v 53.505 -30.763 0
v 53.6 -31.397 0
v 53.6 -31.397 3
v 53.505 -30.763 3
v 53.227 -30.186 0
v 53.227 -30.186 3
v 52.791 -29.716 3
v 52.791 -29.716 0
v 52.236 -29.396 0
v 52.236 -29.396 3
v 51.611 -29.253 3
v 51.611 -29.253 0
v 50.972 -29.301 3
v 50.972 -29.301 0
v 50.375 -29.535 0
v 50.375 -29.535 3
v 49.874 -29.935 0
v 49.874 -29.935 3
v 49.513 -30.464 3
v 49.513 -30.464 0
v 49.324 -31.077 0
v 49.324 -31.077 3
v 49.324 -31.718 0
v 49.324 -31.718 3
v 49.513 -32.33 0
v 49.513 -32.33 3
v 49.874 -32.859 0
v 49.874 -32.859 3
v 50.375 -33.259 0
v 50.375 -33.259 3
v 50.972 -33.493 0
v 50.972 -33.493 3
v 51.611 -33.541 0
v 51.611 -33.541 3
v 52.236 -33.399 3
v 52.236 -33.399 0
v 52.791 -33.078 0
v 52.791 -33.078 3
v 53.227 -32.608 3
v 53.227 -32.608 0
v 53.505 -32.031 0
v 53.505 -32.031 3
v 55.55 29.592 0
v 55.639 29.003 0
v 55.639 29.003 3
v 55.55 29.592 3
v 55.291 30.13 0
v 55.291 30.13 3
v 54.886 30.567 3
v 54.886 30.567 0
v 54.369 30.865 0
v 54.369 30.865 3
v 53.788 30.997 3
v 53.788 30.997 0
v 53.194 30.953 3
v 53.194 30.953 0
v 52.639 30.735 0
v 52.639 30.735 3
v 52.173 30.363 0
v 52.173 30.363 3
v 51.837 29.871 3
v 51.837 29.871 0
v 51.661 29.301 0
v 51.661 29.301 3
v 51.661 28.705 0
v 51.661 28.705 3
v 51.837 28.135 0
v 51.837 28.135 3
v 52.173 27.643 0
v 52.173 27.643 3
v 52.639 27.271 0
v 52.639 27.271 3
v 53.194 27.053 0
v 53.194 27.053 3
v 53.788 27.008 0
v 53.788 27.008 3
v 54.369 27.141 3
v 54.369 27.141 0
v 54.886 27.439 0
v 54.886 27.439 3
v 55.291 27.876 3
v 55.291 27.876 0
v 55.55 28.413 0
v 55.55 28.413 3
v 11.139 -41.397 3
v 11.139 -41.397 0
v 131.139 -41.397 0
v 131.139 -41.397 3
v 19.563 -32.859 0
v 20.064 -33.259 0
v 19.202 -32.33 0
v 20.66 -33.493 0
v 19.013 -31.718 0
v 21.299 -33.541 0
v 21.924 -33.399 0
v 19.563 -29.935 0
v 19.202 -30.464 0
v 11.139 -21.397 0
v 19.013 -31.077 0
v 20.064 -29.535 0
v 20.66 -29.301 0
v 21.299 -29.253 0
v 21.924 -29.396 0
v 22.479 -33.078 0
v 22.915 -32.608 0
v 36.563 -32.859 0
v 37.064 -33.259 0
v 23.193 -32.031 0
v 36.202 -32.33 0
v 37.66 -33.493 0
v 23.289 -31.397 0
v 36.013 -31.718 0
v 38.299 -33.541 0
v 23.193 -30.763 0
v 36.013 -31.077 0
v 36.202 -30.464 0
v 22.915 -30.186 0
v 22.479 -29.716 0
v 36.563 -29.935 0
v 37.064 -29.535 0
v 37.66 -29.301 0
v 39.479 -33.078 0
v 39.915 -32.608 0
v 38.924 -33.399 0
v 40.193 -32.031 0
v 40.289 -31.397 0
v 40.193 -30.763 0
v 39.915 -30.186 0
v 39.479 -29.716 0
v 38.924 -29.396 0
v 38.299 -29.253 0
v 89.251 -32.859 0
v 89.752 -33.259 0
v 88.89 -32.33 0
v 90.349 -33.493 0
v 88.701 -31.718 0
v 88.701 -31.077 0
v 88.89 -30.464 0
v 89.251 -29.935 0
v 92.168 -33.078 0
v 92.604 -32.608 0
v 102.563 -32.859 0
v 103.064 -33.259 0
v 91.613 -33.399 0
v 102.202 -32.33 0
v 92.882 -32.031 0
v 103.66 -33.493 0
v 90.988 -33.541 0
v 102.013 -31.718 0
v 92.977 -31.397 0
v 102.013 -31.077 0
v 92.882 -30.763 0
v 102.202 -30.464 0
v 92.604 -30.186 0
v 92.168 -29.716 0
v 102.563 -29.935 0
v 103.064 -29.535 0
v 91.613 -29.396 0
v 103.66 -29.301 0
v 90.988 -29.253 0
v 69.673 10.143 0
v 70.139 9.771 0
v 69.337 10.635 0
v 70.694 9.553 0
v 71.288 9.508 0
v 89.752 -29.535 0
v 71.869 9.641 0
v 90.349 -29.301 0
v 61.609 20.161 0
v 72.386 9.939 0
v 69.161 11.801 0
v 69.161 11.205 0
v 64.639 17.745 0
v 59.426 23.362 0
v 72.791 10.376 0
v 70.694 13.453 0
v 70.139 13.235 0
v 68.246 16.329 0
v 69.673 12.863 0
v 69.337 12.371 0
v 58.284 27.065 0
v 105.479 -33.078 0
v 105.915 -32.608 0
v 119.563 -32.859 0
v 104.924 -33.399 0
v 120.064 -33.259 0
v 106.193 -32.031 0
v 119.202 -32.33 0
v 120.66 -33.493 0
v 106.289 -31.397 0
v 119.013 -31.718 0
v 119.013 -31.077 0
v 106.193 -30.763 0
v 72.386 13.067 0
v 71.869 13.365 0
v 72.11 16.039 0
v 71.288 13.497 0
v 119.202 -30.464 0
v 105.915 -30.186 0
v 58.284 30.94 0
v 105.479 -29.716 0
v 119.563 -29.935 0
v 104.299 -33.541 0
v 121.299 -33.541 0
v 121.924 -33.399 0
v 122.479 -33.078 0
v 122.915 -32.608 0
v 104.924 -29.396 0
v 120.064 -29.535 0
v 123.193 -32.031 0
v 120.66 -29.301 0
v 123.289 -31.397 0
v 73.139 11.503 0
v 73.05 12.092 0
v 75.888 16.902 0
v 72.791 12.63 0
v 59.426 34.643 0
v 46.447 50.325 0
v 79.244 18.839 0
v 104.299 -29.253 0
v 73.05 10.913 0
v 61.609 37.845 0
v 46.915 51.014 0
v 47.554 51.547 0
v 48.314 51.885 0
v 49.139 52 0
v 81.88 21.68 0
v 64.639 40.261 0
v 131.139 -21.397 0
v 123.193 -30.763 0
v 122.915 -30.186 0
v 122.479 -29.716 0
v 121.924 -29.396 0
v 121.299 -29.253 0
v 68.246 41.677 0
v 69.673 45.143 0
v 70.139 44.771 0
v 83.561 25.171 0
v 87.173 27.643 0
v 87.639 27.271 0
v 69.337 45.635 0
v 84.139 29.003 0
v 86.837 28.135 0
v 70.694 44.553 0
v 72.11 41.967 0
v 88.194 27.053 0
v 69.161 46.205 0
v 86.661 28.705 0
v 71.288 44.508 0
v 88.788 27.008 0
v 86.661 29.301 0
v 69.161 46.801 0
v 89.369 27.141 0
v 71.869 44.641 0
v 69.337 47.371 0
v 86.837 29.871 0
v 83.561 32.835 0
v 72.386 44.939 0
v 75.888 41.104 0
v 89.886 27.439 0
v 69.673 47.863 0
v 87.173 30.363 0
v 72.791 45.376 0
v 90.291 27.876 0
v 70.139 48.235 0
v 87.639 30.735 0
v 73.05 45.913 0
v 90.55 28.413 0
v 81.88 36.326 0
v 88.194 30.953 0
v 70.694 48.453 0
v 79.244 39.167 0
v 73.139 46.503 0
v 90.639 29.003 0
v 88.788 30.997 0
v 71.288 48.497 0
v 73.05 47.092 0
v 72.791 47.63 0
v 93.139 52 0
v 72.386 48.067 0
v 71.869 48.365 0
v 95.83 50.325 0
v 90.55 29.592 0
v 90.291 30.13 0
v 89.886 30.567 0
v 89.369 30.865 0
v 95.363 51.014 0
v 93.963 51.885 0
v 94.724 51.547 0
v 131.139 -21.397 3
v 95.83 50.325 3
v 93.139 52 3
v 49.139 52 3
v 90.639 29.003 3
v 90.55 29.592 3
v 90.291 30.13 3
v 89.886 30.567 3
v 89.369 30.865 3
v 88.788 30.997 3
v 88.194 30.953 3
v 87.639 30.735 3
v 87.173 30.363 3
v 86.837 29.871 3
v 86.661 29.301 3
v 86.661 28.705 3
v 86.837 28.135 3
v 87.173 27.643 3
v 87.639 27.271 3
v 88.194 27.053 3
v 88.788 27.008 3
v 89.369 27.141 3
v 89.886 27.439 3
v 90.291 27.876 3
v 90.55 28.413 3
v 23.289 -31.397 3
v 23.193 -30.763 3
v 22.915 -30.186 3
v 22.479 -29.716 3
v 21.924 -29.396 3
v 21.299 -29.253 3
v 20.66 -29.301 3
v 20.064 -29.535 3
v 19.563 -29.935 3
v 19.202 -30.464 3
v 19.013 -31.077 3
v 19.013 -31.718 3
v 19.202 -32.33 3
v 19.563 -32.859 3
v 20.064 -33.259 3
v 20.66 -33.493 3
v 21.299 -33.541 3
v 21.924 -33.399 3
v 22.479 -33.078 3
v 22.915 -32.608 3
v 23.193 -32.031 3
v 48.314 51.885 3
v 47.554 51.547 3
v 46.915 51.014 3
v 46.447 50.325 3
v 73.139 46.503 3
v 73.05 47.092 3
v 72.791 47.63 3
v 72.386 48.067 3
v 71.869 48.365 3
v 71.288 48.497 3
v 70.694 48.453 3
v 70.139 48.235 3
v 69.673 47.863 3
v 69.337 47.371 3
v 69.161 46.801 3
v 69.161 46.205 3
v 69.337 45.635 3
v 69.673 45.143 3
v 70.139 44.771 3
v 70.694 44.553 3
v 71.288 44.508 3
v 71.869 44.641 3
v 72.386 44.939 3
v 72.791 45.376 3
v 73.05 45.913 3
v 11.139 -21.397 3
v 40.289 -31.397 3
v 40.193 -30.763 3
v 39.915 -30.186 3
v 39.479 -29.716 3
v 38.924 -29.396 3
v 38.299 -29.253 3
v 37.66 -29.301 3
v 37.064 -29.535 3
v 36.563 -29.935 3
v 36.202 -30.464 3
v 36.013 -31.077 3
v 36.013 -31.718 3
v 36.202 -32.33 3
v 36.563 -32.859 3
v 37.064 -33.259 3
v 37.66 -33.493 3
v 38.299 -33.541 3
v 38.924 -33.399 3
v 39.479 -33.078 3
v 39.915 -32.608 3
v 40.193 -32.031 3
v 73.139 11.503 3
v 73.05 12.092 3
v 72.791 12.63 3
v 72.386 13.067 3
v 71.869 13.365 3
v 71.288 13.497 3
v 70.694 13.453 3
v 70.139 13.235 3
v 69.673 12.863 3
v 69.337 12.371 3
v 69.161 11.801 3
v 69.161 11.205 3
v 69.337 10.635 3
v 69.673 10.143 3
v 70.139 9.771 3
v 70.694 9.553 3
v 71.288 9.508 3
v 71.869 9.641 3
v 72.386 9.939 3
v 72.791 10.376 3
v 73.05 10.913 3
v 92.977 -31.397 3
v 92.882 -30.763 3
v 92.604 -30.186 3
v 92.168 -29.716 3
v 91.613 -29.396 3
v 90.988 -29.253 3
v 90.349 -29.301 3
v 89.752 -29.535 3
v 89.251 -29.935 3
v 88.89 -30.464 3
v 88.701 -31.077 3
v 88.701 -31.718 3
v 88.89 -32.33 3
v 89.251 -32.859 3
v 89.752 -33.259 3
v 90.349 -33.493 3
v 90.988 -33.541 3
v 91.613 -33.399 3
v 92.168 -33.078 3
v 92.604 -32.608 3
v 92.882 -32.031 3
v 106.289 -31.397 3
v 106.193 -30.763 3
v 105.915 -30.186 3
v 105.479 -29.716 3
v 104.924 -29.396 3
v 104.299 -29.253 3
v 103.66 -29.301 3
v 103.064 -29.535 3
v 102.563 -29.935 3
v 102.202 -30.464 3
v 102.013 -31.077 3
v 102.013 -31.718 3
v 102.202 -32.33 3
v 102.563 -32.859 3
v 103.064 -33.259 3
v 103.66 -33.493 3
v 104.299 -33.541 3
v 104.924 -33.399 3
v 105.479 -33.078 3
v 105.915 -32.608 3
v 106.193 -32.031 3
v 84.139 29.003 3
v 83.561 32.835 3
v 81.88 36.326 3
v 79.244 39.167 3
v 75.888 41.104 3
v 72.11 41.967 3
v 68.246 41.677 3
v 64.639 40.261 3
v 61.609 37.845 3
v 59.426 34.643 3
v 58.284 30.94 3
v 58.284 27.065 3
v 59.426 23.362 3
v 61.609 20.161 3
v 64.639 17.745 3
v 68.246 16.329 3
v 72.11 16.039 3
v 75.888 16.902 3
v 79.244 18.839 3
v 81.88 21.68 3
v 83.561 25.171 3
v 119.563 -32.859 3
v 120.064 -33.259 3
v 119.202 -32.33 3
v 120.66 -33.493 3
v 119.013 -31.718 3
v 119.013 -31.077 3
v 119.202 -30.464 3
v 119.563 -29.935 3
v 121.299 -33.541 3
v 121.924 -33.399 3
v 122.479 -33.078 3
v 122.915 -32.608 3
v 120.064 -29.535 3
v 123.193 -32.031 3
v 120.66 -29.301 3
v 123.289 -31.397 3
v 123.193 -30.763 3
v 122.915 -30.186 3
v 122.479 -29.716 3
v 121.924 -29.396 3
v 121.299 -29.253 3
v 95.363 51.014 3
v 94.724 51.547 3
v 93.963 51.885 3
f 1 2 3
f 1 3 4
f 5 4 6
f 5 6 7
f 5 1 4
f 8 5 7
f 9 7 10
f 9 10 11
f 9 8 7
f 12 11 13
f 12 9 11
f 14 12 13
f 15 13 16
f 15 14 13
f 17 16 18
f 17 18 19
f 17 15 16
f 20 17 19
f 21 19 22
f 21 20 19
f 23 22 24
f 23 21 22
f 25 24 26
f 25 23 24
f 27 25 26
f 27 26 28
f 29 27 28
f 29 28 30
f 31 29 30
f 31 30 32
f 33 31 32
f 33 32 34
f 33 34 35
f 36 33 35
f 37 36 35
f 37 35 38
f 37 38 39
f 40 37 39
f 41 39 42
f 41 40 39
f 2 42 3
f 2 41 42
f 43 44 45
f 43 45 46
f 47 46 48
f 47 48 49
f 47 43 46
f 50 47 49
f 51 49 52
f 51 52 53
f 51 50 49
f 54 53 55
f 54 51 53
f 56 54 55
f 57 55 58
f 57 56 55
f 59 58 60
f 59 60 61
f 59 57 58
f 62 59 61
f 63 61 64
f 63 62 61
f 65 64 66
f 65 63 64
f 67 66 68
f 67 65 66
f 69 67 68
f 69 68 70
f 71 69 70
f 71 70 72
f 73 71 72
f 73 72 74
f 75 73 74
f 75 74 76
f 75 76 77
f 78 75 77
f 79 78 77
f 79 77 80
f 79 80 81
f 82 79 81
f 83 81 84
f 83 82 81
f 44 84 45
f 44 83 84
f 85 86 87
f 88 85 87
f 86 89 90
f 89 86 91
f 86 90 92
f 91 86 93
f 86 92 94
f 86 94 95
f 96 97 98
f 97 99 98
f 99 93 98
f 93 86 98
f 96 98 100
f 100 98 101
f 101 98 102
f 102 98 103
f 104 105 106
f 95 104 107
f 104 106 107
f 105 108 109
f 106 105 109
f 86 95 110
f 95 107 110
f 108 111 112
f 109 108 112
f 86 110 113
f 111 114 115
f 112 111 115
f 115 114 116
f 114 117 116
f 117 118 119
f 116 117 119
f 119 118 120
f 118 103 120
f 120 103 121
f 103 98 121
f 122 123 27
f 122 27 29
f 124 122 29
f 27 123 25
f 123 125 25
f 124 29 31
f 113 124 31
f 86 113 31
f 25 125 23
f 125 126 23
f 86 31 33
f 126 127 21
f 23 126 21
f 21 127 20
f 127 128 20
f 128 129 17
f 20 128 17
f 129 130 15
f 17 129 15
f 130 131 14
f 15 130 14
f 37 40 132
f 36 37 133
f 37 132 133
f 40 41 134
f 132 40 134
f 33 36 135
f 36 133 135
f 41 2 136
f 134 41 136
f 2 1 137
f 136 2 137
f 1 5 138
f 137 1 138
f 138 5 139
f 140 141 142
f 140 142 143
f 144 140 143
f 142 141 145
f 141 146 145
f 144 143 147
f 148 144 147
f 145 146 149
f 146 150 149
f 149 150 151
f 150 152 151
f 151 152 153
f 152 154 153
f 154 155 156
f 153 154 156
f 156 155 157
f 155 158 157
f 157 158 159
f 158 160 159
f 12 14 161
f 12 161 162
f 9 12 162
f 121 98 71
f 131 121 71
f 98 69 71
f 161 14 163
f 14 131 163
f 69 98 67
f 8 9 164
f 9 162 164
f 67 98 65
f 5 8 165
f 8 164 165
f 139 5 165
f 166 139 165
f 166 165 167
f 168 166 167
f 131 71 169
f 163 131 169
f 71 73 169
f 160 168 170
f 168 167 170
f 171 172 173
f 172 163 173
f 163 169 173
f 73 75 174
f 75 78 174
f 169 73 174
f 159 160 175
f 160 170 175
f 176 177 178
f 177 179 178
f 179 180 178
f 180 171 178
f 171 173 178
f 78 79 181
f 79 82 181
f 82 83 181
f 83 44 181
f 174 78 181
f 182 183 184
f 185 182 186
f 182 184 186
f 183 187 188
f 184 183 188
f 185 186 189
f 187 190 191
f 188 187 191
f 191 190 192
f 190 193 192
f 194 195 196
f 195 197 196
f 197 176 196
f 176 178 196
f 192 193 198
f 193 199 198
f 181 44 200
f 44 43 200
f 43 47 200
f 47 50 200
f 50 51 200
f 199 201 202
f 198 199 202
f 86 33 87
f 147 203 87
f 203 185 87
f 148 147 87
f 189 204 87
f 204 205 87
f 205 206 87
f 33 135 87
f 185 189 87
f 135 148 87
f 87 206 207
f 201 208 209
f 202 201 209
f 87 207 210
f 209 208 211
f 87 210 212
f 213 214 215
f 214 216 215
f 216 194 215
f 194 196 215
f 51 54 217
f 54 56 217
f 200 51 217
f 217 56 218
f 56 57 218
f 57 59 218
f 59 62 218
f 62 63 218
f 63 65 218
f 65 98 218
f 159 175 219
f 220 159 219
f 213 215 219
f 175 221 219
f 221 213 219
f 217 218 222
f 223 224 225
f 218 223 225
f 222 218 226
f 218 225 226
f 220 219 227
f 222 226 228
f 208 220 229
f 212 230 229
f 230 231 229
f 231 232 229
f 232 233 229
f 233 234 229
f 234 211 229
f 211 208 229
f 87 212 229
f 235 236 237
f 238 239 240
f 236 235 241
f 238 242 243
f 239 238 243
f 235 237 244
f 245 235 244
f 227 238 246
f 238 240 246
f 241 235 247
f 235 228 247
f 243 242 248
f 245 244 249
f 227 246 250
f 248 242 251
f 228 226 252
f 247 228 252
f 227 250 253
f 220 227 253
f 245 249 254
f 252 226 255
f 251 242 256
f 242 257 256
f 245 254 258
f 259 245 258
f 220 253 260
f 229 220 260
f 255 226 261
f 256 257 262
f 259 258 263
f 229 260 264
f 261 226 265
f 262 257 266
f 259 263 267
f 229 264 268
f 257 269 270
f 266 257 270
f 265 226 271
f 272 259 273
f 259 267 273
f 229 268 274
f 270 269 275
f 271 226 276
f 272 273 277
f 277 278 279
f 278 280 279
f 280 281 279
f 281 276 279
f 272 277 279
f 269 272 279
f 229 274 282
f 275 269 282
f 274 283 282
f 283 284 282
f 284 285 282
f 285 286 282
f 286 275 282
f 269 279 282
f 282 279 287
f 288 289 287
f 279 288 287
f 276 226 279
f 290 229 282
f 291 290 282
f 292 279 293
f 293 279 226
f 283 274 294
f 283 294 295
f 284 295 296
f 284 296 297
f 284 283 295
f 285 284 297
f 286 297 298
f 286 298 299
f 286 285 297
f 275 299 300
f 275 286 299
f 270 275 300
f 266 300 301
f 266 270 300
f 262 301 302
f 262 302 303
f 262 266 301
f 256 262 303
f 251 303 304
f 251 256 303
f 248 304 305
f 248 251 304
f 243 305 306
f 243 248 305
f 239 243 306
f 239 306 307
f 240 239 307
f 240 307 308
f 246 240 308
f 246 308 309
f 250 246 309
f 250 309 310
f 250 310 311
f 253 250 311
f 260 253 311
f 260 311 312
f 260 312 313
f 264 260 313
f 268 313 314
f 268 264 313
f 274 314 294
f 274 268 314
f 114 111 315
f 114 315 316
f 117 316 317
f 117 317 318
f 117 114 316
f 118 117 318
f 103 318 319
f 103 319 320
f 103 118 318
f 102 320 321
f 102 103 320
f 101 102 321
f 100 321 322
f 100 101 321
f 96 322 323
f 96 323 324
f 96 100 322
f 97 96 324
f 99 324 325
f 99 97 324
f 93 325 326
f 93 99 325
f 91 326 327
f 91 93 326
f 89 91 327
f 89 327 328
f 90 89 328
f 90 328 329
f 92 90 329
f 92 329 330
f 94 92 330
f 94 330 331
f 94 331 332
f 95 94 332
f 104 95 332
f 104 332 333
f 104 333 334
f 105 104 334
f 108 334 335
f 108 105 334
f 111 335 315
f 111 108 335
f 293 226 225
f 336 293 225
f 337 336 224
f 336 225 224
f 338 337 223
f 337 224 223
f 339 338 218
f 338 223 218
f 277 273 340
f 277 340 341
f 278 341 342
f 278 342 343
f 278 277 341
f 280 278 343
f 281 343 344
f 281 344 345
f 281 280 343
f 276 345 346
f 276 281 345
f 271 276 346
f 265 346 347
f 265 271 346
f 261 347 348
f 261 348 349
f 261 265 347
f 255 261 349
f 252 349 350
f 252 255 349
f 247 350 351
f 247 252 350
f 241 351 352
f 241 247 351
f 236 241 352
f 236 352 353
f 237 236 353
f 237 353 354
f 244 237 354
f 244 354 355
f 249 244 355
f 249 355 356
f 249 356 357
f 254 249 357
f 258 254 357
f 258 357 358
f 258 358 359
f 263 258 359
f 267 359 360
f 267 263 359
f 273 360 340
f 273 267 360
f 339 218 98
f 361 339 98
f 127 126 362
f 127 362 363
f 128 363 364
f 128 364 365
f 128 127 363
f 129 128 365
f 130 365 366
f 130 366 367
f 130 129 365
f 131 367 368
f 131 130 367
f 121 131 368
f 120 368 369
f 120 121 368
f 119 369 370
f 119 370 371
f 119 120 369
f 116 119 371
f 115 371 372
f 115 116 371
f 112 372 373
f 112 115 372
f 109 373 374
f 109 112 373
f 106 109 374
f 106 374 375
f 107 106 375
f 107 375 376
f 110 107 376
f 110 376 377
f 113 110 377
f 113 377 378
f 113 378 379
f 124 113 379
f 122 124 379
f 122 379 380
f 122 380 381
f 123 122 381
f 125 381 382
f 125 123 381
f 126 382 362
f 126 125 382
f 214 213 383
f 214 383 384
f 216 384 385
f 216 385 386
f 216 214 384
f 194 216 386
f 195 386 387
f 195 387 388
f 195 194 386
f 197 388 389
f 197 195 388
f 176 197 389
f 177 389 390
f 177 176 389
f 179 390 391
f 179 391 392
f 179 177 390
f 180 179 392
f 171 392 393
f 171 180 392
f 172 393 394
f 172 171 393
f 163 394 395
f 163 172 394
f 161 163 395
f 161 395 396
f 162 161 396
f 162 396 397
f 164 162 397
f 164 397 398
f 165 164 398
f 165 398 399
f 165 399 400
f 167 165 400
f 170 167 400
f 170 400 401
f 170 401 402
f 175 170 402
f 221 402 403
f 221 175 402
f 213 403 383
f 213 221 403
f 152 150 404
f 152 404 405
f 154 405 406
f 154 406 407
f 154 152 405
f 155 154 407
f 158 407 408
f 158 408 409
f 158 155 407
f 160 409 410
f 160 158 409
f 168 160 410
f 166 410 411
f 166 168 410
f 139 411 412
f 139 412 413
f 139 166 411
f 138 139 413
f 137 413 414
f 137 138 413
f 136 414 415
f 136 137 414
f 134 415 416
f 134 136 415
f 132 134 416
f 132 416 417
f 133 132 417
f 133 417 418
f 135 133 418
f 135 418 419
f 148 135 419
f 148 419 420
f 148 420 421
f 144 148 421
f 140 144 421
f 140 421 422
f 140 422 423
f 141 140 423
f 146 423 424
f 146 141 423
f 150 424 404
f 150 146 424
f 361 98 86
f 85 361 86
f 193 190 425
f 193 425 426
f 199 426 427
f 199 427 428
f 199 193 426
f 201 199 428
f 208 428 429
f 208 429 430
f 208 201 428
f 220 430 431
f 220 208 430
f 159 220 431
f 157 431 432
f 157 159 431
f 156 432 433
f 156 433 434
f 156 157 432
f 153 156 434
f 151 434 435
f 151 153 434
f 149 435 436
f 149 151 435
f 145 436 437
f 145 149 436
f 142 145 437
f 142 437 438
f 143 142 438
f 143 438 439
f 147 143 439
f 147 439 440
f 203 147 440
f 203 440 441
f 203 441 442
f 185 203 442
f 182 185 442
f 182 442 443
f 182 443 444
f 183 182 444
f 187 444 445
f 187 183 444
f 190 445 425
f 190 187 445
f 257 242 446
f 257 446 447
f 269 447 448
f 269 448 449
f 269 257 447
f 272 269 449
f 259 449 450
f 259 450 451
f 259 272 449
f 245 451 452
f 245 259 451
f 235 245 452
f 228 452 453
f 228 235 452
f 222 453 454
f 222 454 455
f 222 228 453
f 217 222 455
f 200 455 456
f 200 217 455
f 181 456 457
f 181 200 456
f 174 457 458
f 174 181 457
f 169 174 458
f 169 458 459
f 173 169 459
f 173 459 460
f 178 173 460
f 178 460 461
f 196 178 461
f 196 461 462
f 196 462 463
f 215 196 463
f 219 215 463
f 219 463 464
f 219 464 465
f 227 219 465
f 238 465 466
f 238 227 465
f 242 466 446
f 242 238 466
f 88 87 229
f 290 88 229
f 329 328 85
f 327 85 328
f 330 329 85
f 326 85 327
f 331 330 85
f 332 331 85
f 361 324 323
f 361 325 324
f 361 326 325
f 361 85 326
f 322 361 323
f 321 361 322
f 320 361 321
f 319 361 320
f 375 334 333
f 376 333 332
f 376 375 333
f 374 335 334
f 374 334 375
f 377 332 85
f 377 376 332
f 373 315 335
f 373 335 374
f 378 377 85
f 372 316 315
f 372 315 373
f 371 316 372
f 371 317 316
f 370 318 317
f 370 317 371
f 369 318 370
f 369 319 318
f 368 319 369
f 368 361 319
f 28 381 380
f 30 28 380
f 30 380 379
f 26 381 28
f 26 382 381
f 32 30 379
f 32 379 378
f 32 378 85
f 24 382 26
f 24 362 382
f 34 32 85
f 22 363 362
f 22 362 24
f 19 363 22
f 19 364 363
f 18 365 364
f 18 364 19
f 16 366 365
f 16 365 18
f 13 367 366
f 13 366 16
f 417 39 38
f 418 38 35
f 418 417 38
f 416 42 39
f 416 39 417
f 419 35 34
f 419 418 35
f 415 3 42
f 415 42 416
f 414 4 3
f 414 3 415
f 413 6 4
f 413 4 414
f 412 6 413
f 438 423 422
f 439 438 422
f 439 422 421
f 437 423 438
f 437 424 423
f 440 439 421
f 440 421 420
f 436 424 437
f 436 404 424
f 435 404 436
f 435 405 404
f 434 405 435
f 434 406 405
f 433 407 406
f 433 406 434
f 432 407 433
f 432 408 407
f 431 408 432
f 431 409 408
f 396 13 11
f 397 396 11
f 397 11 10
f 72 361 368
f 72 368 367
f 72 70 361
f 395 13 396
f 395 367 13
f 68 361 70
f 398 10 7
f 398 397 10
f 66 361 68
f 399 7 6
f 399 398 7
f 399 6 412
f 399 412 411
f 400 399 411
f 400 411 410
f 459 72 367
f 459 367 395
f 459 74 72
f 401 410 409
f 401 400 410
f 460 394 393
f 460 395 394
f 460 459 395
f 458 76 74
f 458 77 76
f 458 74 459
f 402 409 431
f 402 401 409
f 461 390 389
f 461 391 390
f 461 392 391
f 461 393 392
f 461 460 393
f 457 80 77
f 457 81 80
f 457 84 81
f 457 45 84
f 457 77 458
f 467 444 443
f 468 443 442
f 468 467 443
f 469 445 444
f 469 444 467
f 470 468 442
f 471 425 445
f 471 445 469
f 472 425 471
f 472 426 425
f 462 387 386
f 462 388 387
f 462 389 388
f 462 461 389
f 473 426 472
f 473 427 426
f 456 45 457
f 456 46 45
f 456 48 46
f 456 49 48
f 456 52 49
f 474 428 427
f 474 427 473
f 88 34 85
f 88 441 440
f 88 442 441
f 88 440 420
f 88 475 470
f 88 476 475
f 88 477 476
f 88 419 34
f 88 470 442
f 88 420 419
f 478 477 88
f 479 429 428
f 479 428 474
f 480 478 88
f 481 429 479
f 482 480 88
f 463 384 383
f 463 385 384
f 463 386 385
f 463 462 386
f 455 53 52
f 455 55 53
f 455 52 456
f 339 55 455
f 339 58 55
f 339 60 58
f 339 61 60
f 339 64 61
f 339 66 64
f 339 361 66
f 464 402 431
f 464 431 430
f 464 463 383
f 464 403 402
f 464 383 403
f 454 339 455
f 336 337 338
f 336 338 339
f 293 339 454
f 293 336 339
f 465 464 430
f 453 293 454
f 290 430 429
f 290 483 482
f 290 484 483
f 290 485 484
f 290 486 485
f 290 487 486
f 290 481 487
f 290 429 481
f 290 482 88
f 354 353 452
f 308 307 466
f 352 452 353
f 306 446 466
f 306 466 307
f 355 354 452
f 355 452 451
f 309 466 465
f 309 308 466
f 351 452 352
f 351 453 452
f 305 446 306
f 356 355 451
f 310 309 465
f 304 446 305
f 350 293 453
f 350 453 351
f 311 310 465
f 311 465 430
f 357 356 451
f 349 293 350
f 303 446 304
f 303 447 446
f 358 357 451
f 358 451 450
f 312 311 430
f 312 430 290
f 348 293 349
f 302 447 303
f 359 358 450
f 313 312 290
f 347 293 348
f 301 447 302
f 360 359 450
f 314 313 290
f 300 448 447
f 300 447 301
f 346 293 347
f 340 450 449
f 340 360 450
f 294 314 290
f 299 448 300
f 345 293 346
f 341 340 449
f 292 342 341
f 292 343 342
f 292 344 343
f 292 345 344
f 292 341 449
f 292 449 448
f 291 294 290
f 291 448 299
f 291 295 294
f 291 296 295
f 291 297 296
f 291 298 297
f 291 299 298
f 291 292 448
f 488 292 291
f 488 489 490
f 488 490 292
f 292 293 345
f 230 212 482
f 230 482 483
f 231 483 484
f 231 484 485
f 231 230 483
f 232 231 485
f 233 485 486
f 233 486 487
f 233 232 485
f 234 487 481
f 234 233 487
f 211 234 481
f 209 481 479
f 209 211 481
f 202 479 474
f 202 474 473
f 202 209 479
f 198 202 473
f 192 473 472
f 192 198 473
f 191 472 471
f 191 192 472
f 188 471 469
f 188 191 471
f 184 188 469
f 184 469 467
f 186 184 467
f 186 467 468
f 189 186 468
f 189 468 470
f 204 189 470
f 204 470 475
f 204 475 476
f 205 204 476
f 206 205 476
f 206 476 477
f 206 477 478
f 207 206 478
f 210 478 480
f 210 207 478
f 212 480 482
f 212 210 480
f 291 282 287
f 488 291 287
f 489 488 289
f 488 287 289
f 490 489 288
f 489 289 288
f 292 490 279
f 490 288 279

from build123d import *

# Parameters (mm, degrees)
SKETCH1_R      = 2.15
EXTRUDE1_DEPTH = 3


with BuildPart() as part:
    # Sketch1 → Extrude1 (new body)
    with BuildSketch(Plane.XY):
        with BuildLine():
            Line((46.447148798, 50.325025124), (11.138674094, -21.397126503))
            Line((11.138674094, -21.397126503), (11.138674094, -41.397126503))
            Line((11.138674094, -41.397126503), (131.138674094, -41.397126503))
            Line((131.138674094, -41.397126503), (131.138674094, -21.397126503))
            Line((131.138674094, -21.397126503), (95.830199391, 50.325025124))
            ThreePointArc((95.830199391, 50.325025124), (94.723748955, 51.547064523), (93.138674094, 52))
            Line((93.138674094, 52), (49.138674094, 52))
            ThreePointArc((49.138674094, 52), (47.553599234, 51.547064523), (46.447148798, 50.325025124))
        make_face()
        with Locations((21.138674094, -31.397126503)):
            Circle(SKETCH1_R, mode=Mode.SUBTRACT)
        with Locations((121.138674094, -31.397126503)):
            Circle(SKETCH1_R, mode=Mode.SUBTRACT)
        with Locations((104.138674094, -31.397126503)):
            Circle(SKETCH1_R, mode=Mode.SUBTRACT)
        with Locations((90.827251635, -31.397126503)):
            Circle(SKETCH1_R, mode=Mode.SUBTRACT)
        with Locations((51.450096554, -31.397126503)):
            Circle(SKETCH1_R, mode=Mode.SUBTRACT)
        with Locations((38.138674094, -31.397126503)):
            Circle(SKETCH1_R, mode=Mode.SUBTRACT)
        with BuildLine():
            ThreePointArc((69.138674094, 11.502873497), (71.138674094, 9.502873497), (73.138674094, 11.502873497))
            ThreePointArc((73.138674094, 11.502873497), (71.138674094, 13.502873497), (69.138674094, 11.502873497))
        make_face(mode=Mode.SUBTRACT)
        with BuildLine():
            ThreePointArc((51.638674094, 29.002873497), (53.638674094, 27.002873497), (55.638674094, 29.002873497))
            ThreePointArc((55.638674094, 29.002873497), (53.638674094, 31.002873497), (51.638674094, 29.002873497))
        make_face(mode=Mode.SUBTRACT)
        with BuildLine():
            ThreePointArc((69.138674094, 46.502873497), (71.138674094, 44.502873497), (73.138674094, 46.502873497))
            ThreePointArc((73.138674094, 46.502873497), (71.138674094, 48.502873497), (69.138674094, 46.502873497))
        make_face(mode=Mode.SUBTRACT)
        with BuildLine():
            ThreePointArc((86.638674094, 29.002873497), (88.638674094, 27.002873497), (90.638674094, 29.002873497))
            ThreePointArc((90.638674094, 29.002873497), (88.638674094, 31.002873497), (86.638674094, 29.002873497))
        make_face(mode=Mode.SUBTRACT)
        with BuildLine():
            ThreePointArc((58.138674094, 29.002873497), (71.138674094, 16.002873497), (84.138674094, 29.002873497))
            ThreePointArc((84.138674094, 29.002873497), (71.138674094, 42.002873497), (58.138674094, 29.002873497))
        make_face(mode=Mode.SUBTRACT)
    extrude(amount=EXTRUDE1_DEPTH)


solid = part.part
